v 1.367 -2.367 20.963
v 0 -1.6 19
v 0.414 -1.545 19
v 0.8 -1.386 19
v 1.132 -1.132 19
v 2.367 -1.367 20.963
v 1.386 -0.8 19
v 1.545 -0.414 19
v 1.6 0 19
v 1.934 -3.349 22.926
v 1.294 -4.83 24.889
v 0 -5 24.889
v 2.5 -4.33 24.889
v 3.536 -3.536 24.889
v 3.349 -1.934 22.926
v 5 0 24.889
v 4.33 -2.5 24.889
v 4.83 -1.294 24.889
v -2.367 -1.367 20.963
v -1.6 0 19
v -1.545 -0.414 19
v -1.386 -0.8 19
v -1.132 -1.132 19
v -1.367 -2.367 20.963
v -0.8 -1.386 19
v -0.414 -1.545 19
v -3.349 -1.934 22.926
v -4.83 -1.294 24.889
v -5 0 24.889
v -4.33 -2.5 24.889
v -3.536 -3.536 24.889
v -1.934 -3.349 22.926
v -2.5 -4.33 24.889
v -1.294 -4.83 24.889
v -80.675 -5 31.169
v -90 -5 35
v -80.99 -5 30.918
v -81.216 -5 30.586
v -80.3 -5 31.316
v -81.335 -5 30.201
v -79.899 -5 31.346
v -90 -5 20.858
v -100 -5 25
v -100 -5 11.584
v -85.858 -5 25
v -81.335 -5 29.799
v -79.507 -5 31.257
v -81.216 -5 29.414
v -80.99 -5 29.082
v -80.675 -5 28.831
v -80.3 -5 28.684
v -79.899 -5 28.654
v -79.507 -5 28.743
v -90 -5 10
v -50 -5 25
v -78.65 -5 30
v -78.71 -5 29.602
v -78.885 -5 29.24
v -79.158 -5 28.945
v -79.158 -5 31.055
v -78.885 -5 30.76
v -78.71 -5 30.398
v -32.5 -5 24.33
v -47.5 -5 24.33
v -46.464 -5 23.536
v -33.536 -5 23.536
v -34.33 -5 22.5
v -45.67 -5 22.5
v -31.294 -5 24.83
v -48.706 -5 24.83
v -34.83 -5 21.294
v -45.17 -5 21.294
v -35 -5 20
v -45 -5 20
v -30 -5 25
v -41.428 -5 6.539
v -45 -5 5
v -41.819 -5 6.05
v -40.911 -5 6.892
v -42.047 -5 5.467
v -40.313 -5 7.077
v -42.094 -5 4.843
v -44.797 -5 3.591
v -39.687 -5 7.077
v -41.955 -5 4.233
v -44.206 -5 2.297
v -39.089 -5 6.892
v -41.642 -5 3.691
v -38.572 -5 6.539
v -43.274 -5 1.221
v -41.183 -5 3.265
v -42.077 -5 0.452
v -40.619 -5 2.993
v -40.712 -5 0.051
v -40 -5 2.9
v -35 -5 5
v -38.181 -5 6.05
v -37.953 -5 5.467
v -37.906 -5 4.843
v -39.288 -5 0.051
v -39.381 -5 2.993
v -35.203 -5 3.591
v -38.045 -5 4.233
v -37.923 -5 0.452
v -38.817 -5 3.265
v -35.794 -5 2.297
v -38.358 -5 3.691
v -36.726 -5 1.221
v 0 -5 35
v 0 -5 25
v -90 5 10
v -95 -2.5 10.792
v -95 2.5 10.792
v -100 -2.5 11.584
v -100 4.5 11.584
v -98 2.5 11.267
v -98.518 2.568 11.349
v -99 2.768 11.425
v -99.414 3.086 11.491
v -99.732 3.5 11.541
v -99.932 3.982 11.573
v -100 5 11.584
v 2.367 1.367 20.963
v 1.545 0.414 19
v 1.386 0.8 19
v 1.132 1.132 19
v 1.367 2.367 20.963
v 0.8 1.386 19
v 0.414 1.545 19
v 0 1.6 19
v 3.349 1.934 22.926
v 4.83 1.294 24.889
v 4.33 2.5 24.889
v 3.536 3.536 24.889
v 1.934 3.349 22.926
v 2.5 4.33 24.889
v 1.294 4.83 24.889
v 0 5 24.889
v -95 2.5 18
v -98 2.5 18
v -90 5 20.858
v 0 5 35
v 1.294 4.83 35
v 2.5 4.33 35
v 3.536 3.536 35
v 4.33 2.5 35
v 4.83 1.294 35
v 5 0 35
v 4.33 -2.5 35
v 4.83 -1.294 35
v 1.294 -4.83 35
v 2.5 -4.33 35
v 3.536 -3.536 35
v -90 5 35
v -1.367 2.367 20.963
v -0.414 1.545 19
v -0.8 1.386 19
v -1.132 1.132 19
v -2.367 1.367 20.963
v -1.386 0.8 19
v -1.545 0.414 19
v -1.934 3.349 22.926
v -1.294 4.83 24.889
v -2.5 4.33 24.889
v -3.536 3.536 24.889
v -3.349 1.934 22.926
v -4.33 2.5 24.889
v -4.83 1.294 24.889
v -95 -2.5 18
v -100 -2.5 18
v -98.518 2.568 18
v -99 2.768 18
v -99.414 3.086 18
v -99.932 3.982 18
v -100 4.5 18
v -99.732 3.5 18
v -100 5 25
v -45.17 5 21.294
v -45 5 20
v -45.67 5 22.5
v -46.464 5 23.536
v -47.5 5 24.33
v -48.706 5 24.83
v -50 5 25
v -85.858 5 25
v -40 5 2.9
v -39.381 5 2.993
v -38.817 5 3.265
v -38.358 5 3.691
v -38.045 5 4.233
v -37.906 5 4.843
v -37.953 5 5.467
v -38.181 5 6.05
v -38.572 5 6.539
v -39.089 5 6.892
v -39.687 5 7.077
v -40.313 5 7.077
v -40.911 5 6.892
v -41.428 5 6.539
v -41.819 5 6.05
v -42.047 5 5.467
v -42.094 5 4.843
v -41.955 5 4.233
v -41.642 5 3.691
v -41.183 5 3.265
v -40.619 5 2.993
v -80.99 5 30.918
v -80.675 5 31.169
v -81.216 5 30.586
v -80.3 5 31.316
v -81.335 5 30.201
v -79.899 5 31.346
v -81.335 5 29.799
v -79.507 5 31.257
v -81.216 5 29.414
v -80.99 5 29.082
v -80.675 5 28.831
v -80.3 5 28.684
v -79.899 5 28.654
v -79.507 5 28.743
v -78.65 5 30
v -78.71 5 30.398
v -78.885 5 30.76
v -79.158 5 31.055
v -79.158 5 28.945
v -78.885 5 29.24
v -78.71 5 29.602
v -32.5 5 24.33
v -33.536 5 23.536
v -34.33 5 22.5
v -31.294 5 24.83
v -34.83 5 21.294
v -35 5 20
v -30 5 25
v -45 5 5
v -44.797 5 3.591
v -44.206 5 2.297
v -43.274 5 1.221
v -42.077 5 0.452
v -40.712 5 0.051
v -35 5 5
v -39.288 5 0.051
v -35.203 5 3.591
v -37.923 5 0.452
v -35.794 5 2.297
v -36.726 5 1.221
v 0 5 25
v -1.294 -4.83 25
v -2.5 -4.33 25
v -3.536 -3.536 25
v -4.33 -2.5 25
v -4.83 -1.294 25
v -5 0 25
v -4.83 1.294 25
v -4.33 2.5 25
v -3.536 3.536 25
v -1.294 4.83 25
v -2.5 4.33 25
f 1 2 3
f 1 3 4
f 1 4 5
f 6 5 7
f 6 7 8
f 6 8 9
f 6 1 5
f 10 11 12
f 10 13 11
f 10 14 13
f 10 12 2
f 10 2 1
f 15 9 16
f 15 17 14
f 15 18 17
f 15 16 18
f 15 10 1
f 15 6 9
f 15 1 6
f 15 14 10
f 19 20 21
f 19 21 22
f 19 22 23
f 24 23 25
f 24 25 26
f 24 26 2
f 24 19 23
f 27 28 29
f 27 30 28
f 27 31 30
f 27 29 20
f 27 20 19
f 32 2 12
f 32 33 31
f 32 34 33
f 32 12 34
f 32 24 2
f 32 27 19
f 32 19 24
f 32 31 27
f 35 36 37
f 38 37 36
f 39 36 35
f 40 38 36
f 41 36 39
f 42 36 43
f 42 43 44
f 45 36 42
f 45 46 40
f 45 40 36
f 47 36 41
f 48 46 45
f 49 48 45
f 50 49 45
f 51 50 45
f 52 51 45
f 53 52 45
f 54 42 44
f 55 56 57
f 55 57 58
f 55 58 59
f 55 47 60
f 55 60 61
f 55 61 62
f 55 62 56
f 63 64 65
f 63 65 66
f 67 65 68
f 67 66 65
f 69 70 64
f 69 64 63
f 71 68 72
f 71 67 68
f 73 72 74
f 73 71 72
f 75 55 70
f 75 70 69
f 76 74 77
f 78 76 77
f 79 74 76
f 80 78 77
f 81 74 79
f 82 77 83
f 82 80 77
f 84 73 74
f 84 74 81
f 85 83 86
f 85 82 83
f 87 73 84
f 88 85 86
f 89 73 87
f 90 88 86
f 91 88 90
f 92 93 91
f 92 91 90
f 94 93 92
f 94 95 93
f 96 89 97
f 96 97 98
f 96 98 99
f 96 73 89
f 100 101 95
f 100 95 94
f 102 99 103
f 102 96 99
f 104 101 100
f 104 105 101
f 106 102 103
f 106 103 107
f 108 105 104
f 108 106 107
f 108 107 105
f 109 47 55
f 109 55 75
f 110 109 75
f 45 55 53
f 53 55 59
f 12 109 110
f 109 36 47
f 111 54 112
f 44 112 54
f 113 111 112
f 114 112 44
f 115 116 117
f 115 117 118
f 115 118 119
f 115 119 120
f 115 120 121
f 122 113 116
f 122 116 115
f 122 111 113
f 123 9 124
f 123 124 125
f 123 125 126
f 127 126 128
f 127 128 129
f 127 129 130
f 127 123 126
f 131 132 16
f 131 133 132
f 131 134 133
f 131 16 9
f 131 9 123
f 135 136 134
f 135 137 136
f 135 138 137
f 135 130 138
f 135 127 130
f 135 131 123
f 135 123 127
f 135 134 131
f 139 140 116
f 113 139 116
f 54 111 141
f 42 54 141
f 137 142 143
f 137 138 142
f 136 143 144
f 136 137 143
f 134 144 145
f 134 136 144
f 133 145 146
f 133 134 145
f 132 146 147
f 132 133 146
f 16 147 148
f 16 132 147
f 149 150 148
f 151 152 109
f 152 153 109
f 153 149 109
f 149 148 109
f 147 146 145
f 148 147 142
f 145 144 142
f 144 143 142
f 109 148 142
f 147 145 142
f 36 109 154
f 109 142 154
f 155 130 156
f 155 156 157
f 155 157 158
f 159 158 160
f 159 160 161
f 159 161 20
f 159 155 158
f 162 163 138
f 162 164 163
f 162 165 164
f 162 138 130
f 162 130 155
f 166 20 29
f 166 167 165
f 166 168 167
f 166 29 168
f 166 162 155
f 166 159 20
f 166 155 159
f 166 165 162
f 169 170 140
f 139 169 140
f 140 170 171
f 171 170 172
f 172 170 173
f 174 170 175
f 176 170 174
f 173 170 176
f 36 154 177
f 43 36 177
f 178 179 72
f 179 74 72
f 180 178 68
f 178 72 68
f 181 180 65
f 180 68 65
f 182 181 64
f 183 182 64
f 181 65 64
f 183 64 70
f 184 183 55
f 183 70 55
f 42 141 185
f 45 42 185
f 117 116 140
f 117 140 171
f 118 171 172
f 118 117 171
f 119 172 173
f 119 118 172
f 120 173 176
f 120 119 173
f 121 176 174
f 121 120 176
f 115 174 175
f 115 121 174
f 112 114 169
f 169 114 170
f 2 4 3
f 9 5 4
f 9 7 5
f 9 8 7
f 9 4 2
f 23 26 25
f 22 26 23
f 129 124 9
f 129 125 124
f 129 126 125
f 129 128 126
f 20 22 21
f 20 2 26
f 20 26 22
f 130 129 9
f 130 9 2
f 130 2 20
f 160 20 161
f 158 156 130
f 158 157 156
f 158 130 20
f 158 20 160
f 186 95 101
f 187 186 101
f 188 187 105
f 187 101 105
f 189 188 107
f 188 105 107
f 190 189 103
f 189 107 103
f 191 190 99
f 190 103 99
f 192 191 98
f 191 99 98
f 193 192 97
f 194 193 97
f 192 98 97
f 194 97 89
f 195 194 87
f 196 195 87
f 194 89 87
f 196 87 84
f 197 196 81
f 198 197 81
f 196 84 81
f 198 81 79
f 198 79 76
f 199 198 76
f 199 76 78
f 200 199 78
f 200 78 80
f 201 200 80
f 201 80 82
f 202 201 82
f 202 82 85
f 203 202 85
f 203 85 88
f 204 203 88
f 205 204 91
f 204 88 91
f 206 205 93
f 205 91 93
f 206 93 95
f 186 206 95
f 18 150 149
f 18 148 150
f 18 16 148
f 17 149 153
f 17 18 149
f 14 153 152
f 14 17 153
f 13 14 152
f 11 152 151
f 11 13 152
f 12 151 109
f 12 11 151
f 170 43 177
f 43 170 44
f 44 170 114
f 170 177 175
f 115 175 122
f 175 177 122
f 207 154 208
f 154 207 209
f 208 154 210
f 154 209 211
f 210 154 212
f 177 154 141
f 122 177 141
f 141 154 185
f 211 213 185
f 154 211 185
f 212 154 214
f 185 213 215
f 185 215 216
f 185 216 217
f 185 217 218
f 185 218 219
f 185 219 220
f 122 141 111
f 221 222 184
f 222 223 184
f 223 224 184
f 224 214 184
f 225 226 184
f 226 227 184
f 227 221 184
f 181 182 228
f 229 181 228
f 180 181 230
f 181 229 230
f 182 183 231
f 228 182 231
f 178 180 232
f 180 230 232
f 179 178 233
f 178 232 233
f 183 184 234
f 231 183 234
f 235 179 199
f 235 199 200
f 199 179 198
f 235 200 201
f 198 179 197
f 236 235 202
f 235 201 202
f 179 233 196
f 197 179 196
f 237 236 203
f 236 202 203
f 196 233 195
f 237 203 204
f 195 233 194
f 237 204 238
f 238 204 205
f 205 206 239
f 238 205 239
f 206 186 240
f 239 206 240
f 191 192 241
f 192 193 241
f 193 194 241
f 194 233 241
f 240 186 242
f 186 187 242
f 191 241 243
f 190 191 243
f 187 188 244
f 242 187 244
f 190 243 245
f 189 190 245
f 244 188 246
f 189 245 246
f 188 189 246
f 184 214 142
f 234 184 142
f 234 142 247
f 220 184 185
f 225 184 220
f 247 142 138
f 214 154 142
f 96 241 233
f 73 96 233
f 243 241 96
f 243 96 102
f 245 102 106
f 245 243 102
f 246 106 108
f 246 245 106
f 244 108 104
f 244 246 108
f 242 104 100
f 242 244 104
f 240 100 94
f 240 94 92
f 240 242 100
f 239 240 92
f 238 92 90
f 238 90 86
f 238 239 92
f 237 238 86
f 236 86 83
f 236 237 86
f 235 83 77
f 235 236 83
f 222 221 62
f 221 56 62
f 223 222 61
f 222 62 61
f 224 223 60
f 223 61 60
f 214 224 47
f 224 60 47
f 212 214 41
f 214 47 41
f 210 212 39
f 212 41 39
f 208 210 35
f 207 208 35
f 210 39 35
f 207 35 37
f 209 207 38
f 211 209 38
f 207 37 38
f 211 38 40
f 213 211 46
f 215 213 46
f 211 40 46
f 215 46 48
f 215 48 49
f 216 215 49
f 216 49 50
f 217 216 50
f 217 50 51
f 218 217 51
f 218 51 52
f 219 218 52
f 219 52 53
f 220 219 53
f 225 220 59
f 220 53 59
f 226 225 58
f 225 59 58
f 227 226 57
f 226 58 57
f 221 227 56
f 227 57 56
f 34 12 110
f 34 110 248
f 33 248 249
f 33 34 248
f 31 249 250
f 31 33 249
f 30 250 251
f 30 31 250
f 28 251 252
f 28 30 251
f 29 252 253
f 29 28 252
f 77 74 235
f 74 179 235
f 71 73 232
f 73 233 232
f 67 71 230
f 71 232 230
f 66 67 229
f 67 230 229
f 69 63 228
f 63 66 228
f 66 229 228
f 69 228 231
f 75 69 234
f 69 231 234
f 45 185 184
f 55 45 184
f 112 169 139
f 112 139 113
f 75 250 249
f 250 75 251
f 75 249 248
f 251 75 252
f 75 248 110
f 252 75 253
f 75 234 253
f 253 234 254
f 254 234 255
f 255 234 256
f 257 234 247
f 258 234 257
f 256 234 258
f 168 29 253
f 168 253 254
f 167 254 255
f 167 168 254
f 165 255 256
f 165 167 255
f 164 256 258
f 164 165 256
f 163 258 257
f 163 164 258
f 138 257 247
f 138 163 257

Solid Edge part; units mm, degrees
sketch "Sketch1" plane through (0, 0, 0) normal (0, -1, 0) x (1, 0, 0)
  line L0 (-5, 25) -> (-5, 19)
  line L1 (5, 19) -> (-5, 19)
  line L2 (5, 35) -> (5, 19)
  line L3 (5, 35) -> (-90, 35)
  line L4 (-90, 35) -> (-100, 25)
  line L5 (-100, 25) -> (-100, 10)
  line L6 (-100, 10) -> (-90, 10)
  line L7 (-90, 10) -> (-90, 20.8579)
  line L8 (-90, 20.8579) -> (-85.8579, 25)
  line L9 (-85.8579, 25) -> (-45, 25)
  line L10 (-45, 25) -> (-45, 5)
  arc A0 (-35, 5) -> (-45, 5) centre (-40, 5) cw
  line L11 (-35, 5) -> (-35, 25)
  line L12 (-35, 25) -> (-5, 25)
  dimension "D1" = 10
  dimension "D2" = 10
  dimension "D3" = 10
  dimension "D4" = 10
  dimension "D5" = 100
  dimension "D6" = 19
  dimension "D7" = 30
  dimension "D8" = 10
  dimension "D9" = 5
extrude "Protrusion1" add sketch "Sketch1" along normal mid plane 10
fillet "Round_1" radius 5 4 edges at (-5, -5, 22) (-5, 5, 22) (5, 5, 27) (5, -5, 27)
sketch "Sketch2" plane through (0, 0, 0) normal (0, -1, 0) x (1, 0, 0)
  circle A0 centre (-80, 30) radius 1.35
  dimension "D1" = 30
  dimension "D2" = 80
extrude "ExtrudedCutout_3" cut sketch "Sketch2" along normal mid plane 29.2691
sketch "Sketch3" plane through (-100, 0, 15) normal (-1, 0, 0) x (0, 0, -1)
  line L0 (5, 2.5) -> (-3, 2.5)
  line L1 (-3, 2.5) -> (-3, -2.5)
  line L2 (-3, -2.5) -> (5, -2.5)
  line L3 (5, -2.5) -> (5, 2.5)
  dimension "D1" = 8
  dimension "D2" = 5
extrude "Cutout1" cut sketch "Sketch3" against normal blind 5
fillet "Round_6" radius 2 1 edges at (-100, 2.5, 14)
hole "Hole_1" at (-40, -5, 5) direction (0, 1, 0) diameter 4.2 end up to next
fillet "Round_7" radius 5 2 edges at (-45, 0, 25) (-35, 0, 25)
chamfer "Chamfer_4" distance 3.4 angle 60 1 edges at (-5, 0, 19) measured on face at (3.4333, -3.2333, 19)
sketch "Sketch4" plane through (0, 0, 0) normal (0, -1, 0) x (1, 0, 0)
  line L0 (-90, 10) -> (-100, 11.5838)
  line L1 (-100, 11.5838) -> (-100, 10)
  line L2 (-100, 10) -> (-90, 10)
extrude "ExtrudedCutout_5" cut sketch "Sketch4" along normal mid plane 99.8036
properties material "PVC"
